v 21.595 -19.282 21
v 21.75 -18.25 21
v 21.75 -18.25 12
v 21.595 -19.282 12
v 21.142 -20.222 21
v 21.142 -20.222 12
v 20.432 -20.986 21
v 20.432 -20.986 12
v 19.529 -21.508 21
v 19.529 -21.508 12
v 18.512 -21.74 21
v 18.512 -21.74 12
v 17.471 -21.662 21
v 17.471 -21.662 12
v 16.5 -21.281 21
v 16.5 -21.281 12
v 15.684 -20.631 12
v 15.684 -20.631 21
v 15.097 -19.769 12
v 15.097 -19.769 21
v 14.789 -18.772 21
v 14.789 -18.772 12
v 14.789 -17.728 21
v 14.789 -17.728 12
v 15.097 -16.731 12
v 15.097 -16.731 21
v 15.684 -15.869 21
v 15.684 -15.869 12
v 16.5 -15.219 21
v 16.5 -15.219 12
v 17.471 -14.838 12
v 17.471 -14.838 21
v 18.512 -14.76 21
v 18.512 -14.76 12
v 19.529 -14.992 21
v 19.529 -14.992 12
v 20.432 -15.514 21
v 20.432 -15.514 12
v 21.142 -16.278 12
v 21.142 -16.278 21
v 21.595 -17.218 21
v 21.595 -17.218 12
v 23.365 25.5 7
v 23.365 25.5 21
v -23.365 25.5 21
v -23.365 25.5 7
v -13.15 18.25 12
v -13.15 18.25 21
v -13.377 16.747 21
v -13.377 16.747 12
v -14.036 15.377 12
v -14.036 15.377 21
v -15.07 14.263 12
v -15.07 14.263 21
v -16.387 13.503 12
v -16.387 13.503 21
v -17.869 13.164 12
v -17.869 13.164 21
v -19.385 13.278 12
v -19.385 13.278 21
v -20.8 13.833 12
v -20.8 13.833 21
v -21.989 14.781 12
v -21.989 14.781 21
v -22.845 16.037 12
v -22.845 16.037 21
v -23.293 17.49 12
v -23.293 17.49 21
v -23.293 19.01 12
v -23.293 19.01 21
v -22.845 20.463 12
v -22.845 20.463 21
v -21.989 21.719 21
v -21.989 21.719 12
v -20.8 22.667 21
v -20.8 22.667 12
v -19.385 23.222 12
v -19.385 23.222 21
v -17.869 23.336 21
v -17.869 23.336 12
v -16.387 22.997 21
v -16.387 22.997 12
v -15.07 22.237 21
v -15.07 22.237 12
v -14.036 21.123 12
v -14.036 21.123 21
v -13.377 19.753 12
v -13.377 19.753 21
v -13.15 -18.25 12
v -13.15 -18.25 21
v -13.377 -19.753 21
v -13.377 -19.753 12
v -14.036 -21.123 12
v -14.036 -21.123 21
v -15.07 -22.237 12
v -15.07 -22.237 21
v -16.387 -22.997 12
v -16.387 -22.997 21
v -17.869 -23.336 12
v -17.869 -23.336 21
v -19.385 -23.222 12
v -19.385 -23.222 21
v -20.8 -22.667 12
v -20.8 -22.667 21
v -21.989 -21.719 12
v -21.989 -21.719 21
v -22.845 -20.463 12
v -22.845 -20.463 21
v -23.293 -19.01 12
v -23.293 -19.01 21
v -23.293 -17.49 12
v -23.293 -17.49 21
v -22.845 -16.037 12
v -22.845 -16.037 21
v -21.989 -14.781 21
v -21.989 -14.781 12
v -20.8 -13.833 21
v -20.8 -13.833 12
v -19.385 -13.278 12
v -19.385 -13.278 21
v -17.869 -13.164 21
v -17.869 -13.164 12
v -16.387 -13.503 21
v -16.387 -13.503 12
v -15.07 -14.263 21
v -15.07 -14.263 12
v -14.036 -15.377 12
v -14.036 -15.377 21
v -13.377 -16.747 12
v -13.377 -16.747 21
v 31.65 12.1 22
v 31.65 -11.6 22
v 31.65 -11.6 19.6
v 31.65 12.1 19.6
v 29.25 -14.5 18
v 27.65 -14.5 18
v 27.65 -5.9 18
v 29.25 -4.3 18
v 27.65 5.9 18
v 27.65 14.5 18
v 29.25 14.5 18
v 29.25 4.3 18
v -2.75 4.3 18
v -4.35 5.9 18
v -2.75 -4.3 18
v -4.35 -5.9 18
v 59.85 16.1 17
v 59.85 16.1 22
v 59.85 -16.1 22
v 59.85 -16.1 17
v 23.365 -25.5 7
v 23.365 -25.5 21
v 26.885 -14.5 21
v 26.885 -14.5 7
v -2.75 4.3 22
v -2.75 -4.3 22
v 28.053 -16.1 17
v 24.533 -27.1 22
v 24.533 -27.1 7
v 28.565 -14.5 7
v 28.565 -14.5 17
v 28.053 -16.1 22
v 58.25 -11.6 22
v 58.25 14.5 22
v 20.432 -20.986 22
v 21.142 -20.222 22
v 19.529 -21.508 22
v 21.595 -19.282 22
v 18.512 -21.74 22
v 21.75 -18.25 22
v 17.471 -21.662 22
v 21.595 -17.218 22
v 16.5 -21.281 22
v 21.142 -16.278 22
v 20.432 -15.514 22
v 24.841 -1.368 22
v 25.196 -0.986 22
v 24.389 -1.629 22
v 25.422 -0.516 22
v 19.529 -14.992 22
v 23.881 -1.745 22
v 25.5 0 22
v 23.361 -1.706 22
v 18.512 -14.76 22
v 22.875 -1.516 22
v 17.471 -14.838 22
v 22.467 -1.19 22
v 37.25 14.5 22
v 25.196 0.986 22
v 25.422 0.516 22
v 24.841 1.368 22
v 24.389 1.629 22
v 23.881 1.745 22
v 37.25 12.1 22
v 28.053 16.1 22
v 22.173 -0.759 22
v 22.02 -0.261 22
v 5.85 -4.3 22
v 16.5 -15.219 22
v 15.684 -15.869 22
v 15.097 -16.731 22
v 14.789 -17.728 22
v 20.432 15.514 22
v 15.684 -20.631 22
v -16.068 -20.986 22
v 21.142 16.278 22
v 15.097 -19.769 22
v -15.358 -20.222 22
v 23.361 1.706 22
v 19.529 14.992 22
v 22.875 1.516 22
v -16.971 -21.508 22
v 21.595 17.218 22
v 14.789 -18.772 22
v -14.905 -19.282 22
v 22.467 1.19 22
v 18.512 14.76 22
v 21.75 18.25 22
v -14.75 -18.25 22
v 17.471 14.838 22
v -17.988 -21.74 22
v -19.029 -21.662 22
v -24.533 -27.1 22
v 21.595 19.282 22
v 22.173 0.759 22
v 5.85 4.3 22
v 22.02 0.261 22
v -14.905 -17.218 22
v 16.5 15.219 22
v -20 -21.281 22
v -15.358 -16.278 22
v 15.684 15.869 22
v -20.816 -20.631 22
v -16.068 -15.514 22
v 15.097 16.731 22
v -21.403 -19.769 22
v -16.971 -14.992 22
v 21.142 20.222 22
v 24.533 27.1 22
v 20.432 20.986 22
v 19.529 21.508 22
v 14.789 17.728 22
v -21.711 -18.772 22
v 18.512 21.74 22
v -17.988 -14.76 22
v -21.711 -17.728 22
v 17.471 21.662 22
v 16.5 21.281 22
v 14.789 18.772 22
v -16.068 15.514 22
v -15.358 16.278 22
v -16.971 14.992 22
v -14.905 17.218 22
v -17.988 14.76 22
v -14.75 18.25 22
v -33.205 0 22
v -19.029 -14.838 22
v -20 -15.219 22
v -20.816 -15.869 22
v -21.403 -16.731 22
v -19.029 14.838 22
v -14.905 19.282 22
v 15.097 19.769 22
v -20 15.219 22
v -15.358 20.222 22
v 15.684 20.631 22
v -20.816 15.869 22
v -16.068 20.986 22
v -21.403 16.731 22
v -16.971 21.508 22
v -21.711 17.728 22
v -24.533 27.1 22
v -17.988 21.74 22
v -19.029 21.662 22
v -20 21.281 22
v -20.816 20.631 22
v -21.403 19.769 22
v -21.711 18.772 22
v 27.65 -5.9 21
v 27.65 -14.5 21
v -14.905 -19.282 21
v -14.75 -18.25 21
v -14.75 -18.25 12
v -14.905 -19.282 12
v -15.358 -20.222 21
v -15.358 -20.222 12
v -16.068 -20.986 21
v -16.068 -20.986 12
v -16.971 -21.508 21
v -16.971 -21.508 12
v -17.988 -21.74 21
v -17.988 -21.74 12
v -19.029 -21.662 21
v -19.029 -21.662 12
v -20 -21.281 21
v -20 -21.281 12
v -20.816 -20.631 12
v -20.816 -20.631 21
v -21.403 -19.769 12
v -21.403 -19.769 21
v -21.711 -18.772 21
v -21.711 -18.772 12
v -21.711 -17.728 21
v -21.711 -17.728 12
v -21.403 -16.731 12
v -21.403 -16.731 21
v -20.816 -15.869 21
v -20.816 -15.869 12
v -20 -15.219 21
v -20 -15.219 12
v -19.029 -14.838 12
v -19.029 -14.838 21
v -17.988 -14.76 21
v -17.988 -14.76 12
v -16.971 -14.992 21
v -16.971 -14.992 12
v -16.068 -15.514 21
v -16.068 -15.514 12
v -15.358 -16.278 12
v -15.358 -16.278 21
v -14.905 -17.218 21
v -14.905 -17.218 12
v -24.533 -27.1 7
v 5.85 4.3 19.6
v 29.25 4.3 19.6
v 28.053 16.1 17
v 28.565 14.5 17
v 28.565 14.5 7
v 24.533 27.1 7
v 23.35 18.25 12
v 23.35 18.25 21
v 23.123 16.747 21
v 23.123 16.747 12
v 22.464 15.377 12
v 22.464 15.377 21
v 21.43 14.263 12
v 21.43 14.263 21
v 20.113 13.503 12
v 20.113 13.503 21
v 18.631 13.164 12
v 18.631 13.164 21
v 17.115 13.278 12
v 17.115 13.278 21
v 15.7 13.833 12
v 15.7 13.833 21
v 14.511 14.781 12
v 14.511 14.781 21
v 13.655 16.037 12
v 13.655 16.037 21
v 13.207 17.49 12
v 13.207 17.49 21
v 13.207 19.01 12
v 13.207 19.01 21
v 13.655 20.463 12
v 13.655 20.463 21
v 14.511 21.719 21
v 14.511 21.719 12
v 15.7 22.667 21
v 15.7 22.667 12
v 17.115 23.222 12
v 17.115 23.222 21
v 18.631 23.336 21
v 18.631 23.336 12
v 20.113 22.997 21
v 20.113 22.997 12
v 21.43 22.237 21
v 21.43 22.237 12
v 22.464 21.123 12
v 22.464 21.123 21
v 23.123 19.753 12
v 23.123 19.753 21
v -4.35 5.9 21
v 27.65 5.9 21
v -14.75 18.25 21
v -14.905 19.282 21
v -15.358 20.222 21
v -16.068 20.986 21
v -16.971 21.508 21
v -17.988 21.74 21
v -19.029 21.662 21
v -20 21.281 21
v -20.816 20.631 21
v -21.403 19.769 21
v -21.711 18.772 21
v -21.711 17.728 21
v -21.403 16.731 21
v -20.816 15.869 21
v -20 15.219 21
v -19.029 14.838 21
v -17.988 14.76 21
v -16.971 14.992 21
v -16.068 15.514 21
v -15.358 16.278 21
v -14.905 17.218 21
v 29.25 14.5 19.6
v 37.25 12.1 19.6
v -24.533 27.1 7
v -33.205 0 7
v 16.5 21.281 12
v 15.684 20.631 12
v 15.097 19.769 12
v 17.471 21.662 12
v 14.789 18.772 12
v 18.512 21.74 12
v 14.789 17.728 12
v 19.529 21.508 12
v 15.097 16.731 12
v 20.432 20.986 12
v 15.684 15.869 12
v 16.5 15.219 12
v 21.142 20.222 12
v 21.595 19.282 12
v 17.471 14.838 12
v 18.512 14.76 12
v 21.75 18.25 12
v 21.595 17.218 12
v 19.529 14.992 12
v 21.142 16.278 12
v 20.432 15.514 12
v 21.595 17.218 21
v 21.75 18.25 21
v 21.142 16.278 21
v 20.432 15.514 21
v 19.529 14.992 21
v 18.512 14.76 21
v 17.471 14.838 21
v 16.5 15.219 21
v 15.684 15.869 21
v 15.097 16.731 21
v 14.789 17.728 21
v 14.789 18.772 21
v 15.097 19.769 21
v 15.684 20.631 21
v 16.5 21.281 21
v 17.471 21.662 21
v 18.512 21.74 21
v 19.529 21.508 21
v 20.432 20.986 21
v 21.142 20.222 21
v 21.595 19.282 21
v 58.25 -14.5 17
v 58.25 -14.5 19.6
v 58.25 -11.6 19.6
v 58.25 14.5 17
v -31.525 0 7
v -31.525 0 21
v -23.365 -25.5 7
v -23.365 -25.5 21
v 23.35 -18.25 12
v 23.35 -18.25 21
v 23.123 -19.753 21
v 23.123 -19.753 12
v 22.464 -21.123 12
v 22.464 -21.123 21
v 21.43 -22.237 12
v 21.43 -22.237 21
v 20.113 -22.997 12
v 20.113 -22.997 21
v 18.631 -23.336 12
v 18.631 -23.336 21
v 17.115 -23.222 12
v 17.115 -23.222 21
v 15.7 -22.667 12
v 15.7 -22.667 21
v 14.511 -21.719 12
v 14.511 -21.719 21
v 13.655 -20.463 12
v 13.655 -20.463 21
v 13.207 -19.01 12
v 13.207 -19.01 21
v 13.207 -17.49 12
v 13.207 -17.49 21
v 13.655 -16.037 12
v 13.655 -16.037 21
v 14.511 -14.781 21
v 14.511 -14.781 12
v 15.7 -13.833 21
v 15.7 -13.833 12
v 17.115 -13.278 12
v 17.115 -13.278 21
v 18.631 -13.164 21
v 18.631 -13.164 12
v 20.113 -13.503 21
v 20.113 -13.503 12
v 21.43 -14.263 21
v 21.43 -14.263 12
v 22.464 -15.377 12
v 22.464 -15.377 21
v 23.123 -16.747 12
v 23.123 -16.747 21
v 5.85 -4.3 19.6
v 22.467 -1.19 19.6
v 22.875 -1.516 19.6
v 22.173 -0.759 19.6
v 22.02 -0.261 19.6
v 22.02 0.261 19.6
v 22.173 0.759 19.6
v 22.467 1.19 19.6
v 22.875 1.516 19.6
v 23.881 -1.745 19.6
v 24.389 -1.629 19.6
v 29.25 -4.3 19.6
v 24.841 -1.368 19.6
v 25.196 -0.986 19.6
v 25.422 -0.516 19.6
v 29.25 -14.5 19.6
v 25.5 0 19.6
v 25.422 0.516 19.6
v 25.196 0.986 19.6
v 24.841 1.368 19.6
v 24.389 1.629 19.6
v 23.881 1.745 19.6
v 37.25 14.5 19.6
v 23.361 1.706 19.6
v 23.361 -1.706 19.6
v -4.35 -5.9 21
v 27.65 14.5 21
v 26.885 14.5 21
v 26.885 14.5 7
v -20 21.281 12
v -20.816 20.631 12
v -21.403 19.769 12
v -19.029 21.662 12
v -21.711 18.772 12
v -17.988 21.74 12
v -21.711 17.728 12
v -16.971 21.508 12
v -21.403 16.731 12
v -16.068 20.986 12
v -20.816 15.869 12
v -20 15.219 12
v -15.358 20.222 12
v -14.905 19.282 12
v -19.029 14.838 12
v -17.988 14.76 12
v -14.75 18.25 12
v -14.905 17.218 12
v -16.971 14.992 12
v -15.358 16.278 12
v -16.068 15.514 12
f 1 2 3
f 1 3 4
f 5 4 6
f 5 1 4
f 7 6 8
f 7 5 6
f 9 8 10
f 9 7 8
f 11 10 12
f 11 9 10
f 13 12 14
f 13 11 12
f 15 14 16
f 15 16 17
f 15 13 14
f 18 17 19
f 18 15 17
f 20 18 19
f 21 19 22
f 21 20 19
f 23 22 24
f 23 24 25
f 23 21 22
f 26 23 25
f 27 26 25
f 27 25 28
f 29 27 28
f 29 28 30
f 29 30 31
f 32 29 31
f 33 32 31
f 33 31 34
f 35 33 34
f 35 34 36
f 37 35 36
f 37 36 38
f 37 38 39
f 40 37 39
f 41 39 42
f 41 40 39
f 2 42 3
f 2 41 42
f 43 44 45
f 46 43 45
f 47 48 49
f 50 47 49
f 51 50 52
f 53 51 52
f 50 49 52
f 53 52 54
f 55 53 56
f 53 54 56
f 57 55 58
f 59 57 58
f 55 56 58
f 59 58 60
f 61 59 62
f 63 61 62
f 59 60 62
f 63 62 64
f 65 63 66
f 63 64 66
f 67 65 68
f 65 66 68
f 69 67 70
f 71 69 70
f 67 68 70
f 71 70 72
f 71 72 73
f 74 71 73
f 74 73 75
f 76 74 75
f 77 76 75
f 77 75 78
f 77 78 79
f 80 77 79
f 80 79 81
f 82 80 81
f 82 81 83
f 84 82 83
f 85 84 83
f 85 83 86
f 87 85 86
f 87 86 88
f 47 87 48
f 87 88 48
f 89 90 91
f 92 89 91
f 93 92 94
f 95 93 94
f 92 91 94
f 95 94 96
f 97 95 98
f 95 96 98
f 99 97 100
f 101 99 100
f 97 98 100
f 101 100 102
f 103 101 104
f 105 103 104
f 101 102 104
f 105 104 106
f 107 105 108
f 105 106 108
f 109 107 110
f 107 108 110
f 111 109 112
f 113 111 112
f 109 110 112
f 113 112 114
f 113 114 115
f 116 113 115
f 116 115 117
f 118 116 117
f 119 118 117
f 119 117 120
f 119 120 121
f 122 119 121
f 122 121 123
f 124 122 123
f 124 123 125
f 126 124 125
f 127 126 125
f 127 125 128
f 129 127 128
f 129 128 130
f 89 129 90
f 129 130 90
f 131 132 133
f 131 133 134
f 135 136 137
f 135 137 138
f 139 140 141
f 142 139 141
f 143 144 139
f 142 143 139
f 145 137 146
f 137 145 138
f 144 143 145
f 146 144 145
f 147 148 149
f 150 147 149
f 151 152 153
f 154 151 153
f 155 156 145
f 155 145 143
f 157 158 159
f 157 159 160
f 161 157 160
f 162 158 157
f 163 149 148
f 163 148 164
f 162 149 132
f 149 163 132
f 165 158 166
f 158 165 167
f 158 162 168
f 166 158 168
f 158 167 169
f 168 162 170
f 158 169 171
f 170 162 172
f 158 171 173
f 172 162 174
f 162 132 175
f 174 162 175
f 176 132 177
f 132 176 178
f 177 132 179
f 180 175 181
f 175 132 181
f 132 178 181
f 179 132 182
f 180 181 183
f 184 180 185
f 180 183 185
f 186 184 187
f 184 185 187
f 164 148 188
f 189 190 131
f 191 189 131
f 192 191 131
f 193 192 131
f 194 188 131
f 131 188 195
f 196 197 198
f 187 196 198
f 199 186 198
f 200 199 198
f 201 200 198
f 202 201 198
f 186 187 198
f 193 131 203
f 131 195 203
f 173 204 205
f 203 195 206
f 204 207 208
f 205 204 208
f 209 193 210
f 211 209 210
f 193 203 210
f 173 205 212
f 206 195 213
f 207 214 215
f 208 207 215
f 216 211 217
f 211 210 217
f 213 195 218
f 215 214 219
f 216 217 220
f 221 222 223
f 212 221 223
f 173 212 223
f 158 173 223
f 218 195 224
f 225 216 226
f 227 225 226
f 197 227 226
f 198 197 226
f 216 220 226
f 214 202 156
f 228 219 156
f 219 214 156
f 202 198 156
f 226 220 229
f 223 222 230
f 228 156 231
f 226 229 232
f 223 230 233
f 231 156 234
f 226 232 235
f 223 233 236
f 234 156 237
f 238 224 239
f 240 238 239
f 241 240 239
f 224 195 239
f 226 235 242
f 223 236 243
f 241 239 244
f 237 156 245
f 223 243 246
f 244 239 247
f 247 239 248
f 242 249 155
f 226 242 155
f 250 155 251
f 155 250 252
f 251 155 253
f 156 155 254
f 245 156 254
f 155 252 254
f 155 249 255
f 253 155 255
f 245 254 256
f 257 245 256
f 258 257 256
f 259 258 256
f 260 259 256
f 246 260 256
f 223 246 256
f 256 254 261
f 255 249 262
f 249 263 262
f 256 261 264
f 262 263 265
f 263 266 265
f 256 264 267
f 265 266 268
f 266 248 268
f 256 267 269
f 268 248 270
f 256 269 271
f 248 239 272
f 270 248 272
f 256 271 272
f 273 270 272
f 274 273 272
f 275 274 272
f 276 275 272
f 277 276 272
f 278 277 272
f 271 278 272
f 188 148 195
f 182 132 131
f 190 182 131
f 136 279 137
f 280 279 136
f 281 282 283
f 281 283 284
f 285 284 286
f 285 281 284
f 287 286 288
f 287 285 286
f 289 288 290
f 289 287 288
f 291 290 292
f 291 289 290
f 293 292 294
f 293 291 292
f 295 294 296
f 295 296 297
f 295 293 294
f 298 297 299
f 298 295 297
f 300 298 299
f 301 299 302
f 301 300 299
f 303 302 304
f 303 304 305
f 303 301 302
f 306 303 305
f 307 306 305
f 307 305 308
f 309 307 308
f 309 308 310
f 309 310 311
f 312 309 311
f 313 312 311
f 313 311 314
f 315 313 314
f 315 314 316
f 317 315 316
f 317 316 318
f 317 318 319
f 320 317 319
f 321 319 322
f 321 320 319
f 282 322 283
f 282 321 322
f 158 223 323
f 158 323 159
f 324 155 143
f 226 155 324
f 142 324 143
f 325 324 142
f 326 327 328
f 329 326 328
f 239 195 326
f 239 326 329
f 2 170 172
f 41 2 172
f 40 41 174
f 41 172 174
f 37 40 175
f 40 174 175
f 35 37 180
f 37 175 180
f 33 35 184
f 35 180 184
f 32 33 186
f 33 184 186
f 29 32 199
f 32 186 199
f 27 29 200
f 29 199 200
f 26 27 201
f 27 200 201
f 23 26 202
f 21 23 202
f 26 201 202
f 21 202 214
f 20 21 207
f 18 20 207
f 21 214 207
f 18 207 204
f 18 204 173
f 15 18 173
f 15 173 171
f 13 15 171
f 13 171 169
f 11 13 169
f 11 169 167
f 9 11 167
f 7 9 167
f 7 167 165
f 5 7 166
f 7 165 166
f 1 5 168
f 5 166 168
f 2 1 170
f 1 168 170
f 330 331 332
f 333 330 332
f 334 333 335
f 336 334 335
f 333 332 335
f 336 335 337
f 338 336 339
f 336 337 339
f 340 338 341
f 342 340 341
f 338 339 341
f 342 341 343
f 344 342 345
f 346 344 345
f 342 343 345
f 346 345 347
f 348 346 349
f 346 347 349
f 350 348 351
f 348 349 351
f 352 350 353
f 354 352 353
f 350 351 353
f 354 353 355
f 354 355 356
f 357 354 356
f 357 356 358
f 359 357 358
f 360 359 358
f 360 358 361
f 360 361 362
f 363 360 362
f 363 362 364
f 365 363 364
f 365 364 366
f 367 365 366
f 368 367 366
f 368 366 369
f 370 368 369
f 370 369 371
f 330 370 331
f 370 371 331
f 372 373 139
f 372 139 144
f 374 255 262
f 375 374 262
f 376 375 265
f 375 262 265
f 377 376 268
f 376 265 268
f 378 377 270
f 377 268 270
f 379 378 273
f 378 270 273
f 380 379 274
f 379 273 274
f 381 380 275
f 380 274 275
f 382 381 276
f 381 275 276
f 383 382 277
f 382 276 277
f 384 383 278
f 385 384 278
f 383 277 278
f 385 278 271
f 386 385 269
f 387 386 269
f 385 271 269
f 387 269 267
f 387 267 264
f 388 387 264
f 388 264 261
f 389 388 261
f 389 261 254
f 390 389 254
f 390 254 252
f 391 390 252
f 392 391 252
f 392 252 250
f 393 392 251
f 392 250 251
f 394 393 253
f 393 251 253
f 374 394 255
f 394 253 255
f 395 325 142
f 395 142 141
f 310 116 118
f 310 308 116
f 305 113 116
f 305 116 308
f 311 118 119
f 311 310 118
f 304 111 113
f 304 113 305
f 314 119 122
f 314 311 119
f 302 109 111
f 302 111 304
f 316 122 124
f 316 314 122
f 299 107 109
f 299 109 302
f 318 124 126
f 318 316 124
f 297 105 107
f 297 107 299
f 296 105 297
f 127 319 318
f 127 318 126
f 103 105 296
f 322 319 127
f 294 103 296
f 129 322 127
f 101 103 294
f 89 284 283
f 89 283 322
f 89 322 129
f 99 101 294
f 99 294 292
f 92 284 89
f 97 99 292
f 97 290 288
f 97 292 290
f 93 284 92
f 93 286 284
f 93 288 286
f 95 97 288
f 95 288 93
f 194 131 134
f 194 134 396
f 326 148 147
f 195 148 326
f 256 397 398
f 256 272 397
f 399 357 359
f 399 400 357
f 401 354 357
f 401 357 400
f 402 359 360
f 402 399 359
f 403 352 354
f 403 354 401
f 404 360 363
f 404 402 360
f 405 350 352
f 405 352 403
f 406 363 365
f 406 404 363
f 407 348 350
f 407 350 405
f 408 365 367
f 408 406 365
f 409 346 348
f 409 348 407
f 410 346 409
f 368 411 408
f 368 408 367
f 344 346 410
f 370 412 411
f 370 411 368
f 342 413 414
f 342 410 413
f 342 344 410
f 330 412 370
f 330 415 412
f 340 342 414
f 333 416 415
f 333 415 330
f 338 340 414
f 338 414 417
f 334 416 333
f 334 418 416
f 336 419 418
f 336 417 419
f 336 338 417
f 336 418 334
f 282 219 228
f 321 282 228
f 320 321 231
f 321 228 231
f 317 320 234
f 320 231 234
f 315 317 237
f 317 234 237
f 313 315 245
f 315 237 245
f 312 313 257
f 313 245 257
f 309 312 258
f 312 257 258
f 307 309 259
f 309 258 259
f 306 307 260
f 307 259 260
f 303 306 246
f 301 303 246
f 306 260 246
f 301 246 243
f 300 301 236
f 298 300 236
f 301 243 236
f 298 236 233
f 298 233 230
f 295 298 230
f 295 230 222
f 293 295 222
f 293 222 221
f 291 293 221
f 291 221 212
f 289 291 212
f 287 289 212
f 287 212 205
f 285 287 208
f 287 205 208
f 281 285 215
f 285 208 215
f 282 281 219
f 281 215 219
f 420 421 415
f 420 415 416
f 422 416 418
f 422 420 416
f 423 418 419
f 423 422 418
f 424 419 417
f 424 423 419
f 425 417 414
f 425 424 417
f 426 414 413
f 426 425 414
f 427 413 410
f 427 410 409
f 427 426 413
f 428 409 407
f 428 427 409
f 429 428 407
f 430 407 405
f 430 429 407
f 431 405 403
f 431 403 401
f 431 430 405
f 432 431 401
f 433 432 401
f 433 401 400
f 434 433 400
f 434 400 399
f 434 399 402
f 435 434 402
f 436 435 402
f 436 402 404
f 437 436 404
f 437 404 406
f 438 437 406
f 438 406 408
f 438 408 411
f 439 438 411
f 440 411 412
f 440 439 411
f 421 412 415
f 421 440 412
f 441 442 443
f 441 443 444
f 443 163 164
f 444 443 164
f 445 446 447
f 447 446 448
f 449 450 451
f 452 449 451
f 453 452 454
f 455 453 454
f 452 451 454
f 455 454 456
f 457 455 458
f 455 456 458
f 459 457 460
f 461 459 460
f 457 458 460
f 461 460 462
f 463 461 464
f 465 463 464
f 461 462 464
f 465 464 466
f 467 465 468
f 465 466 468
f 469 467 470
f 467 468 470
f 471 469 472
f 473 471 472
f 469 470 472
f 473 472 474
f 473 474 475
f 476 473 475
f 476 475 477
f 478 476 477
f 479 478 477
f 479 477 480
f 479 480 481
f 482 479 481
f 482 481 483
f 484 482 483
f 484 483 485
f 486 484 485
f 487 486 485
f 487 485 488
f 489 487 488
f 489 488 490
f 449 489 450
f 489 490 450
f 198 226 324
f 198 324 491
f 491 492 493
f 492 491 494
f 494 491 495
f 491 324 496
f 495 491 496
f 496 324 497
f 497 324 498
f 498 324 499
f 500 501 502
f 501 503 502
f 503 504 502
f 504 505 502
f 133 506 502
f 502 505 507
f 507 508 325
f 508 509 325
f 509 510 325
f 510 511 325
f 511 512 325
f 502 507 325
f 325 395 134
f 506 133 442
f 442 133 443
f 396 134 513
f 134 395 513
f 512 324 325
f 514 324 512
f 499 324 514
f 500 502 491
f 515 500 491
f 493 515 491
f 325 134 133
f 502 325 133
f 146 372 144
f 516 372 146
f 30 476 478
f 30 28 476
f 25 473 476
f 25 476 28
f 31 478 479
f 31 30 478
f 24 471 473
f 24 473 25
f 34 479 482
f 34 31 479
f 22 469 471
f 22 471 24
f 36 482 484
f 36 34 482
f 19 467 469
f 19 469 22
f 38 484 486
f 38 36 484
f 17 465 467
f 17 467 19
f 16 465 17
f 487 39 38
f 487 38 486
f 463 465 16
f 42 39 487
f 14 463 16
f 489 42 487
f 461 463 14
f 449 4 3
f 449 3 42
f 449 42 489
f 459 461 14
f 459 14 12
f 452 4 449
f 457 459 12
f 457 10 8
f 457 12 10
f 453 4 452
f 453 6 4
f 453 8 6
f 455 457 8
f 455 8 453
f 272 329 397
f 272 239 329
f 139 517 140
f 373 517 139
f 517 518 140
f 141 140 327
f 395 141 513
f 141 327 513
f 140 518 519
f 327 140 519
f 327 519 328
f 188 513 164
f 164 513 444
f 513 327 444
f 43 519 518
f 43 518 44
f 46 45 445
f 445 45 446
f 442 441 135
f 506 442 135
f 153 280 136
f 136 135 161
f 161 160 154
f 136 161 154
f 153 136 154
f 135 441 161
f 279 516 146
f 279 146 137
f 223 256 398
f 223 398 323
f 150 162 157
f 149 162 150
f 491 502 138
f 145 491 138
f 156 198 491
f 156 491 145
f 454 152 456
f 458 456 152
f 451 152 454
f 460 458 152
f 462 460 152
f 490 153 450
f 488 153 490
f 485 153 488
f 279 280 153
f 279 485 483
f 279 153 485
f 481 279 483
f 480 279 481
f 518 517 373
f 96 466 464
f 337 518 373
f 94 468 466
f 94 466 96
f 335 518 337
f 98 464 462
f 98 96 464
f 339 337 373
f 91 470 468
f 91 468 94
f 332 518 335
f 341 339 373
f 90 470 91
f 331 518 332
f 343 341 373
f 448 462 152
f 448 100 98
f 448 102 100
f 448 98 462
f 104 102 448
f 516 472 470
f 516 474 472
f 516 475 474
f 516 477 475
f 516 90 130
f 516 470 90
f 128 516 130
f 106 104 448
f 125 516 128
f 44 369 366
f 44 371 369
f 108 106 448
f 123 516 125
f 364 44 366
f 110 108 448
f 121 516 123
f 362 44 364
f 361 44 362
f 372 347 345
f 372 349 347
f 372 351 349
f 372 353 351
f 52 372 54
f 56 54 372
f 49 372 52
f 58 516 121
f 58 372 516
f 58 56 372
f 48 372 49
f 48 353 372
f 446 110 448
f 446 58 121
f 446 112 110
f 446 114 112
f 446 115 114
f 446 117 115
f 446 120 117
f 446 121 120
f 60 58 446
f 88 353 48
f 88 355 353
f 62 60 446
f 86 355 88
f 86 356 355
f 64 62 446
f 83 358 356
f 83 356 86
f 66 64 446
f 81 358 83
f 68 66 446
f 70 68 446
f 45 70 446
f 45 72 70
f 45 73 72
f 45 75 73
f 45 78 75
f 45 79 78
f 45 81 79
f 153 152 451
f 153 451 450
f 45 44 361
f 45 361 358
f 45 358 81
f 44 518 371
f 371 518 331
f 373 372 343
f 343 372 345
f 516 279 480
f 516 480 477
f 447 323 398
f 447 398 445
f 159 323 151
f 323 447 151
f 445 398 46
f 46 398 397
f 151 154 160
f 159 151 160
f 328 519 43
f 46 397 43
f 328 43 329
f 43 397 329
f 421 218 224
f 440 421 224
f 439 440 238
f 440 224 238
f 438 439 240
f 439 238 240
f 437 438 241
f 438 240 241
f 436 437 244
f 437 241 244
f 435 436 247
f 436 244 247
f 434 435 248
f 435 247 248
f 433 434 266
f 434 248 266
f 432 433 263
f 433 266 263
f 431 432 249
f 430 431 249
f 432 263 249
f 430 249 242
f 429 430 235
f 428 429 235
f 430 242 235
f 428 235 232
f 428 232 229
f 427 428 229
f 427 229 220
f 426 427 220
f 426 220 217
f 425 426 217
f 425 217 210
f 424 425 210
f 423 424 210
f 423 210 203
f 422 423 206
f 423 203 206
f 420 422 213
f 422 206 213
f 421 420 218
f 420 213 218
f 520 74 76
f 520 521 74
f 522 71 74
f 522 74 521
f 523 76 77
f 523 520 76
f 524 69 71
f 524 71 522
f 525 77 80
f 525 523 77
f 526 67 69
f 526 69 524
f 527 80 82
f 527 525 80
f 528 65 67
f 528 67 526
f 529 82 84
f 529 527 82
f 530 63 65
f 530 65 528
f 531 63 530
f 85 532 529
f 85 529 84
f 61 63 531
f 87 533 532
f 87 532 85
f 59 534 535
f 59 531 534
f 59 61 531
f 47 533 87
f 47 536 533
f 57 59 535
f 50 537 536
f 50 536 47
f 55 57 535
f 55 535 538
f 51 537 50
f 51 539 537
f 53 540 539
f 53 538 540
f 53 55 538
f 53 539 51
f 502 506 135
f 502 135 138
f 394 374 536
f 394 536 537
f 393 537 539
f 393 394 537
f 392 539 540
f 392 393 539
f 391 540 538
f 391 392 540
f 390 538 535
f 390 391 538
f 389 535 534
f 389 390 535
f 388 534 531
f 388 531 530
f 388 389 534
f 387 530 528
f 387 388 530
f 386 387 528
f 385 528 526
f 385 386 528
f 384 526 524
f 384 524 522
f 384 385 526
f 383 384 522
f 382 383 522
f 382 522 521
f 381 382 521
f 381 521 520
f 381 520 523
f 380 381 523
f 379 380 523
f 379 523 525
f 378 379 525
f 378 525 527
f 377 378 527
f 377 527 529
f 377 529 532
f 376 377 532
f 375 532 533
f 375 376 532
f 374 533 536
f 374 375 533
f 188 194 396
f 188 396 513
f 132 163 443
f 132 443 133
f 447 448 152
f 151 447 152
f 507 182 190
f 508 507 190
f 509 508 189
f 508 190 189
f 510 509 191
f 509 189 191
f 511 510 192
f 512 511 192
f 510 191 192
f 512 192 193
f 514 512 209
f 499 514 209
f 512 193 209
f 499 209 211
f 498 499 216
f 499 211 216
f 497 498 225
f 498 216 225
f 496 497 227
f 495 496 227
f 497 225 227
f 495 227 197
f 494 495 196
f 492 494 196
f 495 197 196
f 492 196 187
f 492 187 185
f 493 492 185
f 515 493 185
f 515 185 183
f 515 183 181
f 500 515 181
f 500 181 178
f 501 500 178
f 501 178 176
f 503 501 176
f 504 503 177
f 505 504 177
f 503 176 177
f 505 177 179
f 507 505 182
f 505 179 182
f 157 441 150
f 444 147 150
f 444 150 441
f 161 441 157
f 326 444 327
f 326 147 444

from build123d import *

# Parameters (mm, degrees)
BOSS_EXTRUDE1_DEPTH      = 10
BOSS_EXTRUDE1_DEPTH_BACK = 5
BOSS_EXTRUDE2_DEPTH      = 5
CUT_EXTRUDE1_DEPTH       = 68.390151358
BOSS_EXTRUDE3_DEPTH      = 4
SKETCH7_R                = 1.75
BOSS_EXTRUDE4_DEPTH      = 2.4
SKETCH8_R                = 3.5
BOSS_EXTRUDE5_DEPTH      = 1
SKETCH9_R                = 5.1
SKETCH9_R_2              = 3.5
BOSS_EXTRUDE6_DEPTH      = 9


with BuildPart() as part:
    # Sketch2 → Boss-Extrude1 (new, two sides)
    with BuildSketch(Plane.XY.offset(12)) as boss_extrude1_sk:
        Polygon((-24.532899998, 27.1), (-33.204899998, 0), (-24.532899998, -27.1), (24.532899998, -27.1), (33.204899998, 0), (24.532899998, 27.1), align=None)
        Polygon((-23.36497619, 25.5), (-31.52497619, 0), (-23.36497619, -25.5), (23.36497619, -25.5), (31.52497619, 0), (23.36497619, 25.5), align=None, mode=Mode.SUBTRACT)
    extrude(amount=BOSS_EXTRUDE1_DEPTH)
    extrude(boss_extrude1_sk.sketch, amount=-BOSS_EXTRUDE1_DEPTH_BACK)

    # Sketch3 → Boss-Extrude2 (add)
    with BuildSketch(Plane.XY.offset(22)):
        Polygon((29.75, 16.1), (59.85, 16.1), (59.85, -16.1), (29.75, -16.1), (28.052899998, -16.1), (28.564899998, -14.5), (29.75, -14.5), (58.25, -14.5), (58.25, 14.5), (29.75, 14.5), (28.564899998, 14.5), (28.052899998, 16.1), align=None)
    extrude(amount=-BOSS_EXTRUDE2_DEPTH)

    # Sketch4 → Cut-Extrude1 (cut, through all)
    with BuildSketch(Plane(origin=(0, 0, 7), x_dir=(-1, 0, 0), z_dir=(0, 0, -1))):
        Polygon((-26.88497619, 14.5), (-28.564899998, 14.5), (-33.204899998, 0), (-28.564899998, -14.5), (-26.88497619, -14.5), (-31.52497619, 0), align=None)
    extrude(amount=-CUT_EXTRUDE1_DEPTH, mode=Mode.SUBTRACT)

    # Sketch5 → Boss-Extrude3 (add)
    with BuildSketch(Plane.XY.offset(22)):
        Polygon((29.25, 4.3), (29.25, 14), (29.25, 14.5), (27.65, 14.5), (27.65, 14), (27.65, 5.9), (-4.35, 5.9), (-4.35, -5.9), (27.65, -5.9), (27.65, -14), (27.65, -14.5), (29.25, -14.5), (29.25, -14), (29.25, -4.3), (-2.75, -4.3), (-2.75, 4.3), align=None)
    extrude(amount=-BOSS_EXTRUDE3_DEPTH)

    # Sketch7 → Boss-Extrude4 (add)
    with BuildSketch(Plane.XY.offset(22)):
        Polygon((37.25, 12.1), (37.25, 14.5), (29.25, 14.5), (29.25, 4.3), (5.85, 4.3), (5.85, -4.3), (29.25, -4.3), (29.25, -14.5), (58.25, -14.5), (58.25, -11.6), (31.65, -11.6), (31.65, 12.1), align=None)
        with Locations((23.75, 0)):
            Circle(SKETCH7_R, mode=Mode.SUBTRACT)
    extrude(amount=-BOSS_EXTRUDE4_DEPTH)

    # Sketch8 → Boss-Extrude5 (add)
    with BuildSketch(Plane.XY.offset(22)):
        Polygon((27.65, -5.9), (27.65, -14.5), (26.88497619, -14.5), (23.36497619, -25.5), (-23.36497619, -25.5), (-31.52497619, 0), (-23.36497619, 25.5), (23.36497619, 25.5), (26.88497619, 14.5), (27.65, 14.5), (27.65, 5.9), (-4.35, 5.9), (-4.35, -5.9), align=None)
        with Locations((-18.25, 18.25)):
            Circle(SKETCH8_R, mode=Mode.SUBTRACT)
        with Locations((18.25, 18.25)):
            Circle(SKETCH8_R, mode=Mode.SUBTRACT)
        with Locations((18.25, -18.25)):
            Circle(SKETCH8_R, mode=Mode.SUBTRACT)
        with Locations((-18.25, -18.25)):
            Circle(SKETCH8_R, mode=Mode.SUBTRACT)
    extrude(amount=-BOSS_EXTRUDE5_DEPTH)

    # Sketch9 → Boss-Extrude6 (add)
    with BuildSketch(Plane(origin=(0, 0, 21), x_dir=(-1, 0, 0), z_dir=(0, 0, -1))):
        with Locations(Location((-18.25, 18.25, 0), (0, 0, 180))):
            Circle(SKETCH9_R)
        with Locations(Location((-18.25, 18.25, 0), (0, 0, 180))):
            Circle(SKETCH9_R_2, mode=Mode.SUBTRACT)
        with Locations(Location((18.25, 18.25, 0), (0, 0, 180))):
            Circle(SKETCH9_R)
        with Locations(Location((18.25, 18.25, 0), (0, 0, 180))):
            Circle(SKETCH9_R_2, mode=Mode.SUBTRACT)
        with Locations(Location((18.25, -18.25, 0), (0, 0, 180))):
            Circle(SKETCH9_R)
        with Locations(Location((18.25, -18.25, 0), (0, 0, 180))):
            Circle(SKETCH9_R_2, mode=Mode.SUBTRACT)
        with Locations(Location((-18.25, -18.25, 0), (0, 0, 180))):
            Circle(SKETCH9_R)
        with Locations(Location((-18.25, -18.25, 0), (0, 0, 180))):
            Circle(SKETCH9_R_2, mode=Mode.SUBTRACT)
    extrude(amount=BOSS_EXTRUDE6_DEPTH)


solid = part.part
